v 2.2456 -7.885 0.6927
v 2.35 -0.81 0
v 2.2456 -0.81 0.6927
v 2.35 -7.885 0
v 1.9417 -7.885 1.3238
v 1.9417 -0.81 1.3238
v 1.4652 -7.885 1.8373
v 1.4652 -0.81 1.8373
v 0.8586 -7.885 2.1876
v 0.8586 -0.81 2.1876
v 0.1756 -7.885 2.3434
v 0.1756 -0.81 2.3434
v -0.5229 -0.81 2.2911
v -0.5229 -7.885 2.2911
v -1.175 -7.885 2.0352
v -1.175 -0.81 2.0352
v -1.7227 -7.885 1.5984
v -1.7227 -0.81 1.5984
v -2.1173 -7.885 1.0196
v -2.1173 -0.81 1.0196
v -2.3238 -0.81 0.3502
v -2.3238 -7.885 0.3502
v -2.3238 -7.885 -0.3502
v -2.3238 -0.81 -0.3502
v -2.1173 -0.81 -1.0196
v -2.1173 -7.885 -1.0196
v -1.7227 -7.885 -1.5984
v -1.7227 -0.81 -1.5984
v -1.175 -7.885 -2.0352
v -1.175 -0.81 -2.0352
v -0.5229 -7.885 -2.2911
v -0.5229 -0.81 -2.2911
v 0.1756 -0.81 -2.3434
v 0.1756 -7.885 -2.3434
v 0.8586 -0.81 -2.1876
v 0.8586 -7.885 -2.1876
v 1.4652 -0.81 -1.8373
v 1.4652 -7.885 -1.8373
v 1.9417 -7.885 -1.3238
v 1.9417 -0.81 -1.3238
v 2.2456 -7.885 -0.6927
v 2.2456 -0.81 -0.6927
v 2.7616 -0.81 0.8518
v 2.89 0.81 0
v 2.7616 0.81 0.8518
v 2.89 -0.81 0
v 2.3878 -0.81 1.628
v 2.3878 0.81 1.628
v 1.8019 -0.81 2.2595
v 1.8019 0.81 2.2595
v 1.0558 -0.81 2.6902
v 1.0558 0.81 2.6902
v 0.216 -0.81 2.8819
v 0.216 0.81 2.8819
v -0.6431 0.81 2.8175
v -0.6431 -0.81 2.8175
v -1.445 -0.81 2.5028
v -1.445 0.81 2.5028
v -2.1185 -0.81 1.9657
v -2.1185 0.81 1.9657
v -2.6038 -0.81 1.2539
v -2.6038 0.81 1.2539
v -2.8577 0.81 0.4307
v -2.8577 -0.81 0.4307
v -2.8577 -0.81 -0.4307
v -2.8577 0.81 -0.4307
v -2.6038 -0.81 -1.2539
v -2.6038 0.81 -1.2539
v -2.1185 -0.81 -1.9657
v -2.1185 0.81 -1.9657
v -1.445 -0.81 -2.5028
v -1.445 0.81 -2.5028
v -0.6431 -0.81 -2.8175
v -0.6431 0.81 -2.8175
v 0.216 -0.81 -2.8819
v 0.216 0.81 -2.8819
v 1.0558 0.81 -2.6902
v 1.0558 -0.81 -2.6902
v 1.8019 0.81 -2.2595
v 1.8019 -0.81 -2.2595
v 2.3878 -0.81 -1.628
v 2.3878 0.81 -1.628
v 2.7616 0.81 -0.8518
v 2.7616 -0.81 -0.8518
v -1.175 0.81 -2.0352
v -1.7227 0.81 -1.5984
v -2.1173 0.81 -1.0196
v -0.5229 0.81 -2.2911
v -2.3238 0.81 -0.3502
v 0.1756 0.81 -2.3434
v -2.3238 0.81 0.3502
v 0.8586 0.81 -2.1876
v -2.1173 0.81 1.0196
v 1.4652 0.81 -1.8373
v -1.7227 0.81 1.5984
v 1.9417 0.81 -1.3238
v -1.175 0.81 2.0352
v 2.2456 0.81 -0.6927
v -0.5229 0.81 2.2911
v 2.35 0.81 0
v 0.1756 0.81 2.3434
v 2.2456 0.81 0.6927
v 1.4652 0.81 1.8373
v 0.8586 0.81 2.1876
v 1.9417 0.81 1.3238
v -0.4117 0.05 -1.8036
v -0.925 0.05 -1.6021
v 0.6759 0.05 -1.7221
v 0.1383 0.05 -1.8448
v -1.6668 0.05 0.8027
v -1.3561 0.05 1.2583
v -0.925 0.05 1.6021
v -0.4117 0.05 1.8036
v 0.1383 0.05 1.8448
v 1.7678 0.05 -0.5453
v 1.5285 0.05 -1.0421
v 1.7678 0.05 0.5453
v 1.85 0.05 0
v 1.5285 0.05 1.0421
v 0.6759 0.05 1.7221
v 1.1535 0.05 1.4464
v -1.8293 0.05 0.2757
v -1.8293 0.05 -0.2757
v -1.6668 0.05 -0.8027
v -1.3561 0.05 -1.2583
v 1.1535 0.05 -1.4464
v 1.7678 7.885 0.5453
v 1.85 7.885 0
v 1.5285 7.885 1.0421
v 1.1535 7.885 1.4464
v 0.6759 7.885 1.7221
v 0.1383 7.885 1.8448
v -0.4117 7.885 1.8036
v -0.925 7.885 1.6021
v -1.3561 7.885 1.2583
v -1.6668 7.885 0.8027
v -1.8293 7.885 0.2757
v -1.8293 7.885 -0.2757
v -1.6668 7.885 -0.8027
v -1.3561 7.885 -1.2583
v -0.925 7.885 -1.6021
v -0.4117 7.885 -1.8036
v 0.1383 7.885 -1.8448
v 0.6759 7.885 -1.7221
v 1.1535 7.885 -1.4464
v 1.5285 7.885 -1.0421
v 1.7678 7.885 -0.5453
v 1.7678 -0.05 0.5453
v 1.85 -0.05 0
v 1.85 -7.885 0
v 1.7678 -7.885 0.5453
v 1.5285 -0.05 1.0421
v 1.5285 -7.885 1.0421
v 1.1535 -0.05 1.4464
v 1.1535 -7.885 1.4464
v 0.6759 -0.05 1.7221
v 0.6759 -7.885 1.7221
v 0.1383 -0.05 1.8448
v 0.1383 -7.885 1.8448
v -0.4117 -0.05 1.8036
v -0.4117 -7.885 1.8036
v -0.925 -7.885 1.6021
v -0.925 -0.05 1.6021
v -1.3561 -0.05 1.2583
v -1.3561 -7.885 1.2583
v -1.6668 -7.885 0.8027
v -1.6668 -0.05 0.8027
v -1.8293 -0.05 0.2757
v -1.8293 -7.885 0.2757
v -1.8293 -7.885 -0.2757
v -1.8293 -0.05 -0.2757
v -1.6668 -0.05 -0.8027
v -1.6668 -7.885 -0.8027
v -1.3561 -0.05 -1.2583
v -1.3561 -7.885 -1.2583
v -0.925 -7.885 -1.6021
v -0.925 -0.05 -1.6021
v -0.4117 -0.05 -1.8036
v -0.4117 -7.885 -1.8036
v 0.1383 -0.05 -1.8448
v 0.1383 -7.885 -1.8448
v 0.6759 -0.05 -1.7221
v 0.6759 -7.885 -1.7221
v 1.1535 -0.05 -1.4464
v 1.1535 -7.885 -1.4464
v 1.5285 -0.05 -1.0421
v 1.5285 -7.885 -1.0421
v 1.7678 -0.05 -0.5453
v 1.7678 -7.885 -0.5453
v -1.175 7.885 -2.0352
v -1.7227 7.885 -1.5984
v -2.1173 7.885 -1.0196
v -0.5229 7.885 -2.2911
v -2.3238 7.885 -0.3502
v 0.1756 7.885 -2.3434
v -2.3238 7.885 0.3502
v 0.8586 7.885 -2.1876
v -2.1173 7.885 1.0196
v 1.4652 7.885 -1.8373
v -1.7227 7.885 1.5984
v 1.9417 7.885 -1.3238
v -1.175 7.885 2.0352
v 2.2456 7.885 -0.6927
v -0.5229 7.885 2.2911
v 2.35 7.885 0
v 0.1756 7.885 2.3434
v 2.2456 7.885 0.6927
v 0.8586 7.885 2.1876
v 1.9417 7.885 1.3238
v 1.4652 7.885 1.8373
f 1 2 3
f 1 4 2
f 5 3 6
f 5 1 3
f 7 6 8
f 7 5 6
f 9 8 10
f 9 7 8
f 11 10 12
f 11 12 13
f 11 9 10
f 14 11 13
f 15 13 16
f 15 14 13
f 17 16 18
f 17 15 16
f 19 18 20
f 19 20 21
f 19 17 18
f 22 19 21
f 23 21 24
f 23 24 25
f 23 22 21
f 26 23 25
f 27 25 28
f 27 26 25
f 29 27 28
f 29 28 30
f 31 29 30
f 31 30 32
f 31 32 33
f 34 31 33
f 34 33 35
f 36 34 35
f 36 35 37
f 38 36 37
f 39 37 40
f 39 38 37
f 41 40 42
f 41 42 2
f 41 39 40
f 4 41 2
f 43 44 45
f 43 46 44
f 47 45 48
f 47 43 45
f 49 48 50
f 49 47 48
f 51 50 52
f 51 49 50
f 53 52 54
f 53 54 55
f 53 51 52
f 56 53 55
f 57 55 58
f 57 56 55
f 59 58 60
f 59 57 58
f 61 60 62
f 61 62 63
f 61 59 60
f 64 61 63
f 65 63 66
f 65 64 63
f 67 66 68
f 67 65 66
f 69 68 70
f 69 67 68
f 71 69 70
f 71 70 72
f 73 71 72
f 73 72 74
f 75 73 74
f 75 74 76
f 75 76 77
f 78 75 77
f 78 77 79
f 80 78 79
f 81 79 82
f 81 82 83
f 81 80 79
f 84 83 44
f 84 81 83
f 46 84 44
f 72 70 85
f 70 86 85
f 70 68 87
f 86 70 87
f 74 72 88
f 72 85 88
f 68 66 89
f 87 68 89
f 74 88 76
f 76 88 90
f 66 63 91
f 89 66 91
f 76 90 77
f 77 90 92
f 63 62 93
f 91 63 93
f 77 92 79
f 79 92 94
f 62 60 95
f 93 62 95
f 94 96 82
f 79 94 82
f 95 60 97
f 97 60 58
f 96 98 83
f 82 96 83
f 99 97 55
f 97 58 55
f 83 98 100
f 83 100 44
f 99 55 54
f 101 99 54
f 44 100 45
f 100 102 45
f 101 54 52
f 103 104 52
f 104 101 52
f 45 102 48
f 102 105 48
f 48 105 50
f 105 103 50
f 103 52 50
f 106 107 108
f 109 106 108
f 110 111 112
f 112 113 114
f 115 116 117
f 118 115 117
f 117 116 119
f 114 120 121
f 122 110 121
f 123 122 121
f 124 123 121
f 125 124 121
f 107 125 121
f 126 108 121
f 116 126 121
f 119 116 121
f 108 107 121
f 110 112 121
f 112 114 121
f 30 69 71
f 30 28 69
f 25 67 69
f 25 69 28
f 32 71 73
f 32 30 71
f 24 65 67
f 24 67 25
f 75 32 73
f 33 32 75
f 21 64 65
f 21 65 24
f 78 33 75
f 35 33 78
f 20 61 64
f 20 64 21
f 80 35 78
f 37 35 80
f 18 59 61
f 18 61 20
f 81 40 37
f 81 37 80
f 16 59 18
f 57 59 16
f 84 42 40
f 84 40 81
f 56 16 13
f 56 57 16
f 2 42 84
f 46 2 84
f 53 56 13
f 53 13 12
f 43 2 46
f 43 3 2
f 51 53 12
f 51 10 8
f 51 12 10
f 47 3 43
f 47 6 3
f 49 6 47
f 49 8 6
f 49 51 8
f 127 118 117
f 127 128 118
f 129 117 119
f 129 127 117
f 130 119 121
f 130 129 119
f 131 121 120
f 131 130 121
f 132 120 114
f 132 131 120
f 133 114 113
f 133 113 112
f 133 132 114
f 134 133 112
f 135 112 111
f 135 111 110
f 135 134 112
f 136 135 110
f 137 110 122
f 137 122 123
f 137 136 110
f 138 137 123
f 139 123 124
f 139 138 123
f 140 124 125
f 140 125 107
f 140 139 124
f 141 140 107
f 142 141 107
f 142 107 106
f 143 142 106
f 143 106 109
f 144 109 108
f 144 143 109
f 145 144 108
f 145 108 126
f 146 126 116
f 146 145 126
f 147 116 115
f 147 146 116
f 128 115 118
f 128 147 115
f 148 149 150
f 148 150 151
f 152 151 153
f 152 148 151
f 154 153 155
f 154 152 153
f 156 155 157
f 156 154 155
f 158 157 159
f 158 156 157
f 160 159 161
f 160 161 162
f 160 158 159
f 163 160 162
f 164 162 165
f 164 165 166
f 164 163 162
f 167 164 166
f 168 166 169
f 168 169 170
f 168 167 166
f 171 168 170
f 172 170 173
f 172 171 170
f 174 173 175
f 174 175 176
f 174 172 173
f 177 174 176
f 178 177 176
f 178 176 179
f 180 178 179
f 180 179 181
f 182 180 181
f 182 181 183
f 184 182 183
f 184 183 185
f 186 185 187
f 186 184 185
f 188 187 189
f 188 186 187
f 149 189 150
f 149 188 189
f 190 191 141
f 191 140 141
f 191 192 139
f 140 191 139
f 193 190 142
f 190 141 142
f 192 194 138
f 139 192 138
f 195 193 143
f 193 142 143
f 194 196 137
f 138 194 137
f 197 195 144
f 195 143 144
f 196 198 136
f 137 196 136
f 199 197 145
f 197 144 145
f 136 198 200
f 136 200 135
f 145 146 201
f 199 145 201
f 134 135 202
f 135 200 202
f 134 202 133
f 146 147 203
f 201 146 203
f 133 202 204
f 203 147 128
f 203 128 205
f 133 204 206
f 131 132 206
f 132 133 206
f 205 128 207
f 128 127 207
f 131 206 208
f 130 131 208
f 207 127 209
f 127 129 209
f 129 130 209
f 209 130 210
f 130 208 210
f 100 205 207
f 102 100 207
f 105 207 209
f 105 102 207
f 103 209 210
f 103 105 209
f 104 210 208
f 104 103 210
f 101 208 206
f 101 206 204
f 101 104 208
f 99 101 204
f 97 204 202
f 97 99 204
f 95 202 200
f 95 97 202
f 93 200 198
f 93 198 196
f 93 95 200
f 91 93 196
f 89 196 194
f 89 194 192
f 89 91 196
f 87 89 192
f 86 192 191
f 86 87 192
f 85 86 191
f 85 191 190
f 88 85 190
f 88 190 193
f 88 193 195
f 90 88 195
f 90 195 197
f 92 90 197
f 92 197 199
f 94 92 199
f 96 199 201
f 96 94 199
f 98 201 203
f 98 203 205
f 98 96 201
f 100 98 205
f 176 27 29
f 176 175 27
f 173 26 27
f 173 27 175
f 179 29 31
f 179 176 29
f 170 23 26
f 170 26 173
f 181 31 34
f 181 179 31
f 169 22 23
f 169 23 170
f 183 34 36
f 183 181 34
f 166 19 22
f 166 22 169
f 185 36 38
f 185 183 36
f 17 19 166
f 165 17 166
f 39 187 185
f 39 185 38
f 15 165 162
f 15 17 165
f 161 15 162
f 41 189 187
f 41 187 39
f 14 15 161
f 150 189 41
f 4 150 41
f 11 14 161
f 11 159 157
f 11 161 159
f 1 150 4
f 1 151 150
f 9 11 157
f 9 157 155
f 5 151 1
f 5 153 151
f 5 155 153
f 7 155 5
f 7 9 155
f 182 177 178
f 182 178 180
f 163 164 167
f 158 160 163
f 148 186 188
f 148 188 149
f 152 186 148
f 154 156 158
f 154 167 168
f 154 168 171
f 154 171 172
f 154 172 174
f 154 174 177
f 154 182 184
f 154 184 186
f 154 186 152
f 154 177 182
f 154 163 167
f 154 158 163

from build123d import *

# Parameters (mm, degrees)
F0_R     = 2.89
F0_R_2   = 2.35
F1_DEPTH = 0.81
F0_R_3   = 1.85
F2_DEPTH = 7.885
F3_DEPTH = 0.05


with BuildPart() as f1:
    # F0 (on Front) → F1 (new body, symmetric)
    with BuildSketch(Plane.XZ):
        Circle(F0_R)
        Circle(F0_R_2, mode=Mode.SUBTRACT)
    extrude(amount=F1_DEPTH, both=True)

    # F0 (on Front) → F2 (join, symmetric)
    with BuildSketch(Plane.XZ):
        Circle(F0_R_2)
        Circle(F0_R_3, mode=Mode.SUBTRACT)
    extrude(amount=F2_DEPTH, both=True)

    # F0 (on Front) → F3 (join, symmetric)
    with BuildSketch(Plane.XZ):
        Circle(F0_R_3)
    extrude(amount=F3_DEPTH, both=True)


solid = f1.part
